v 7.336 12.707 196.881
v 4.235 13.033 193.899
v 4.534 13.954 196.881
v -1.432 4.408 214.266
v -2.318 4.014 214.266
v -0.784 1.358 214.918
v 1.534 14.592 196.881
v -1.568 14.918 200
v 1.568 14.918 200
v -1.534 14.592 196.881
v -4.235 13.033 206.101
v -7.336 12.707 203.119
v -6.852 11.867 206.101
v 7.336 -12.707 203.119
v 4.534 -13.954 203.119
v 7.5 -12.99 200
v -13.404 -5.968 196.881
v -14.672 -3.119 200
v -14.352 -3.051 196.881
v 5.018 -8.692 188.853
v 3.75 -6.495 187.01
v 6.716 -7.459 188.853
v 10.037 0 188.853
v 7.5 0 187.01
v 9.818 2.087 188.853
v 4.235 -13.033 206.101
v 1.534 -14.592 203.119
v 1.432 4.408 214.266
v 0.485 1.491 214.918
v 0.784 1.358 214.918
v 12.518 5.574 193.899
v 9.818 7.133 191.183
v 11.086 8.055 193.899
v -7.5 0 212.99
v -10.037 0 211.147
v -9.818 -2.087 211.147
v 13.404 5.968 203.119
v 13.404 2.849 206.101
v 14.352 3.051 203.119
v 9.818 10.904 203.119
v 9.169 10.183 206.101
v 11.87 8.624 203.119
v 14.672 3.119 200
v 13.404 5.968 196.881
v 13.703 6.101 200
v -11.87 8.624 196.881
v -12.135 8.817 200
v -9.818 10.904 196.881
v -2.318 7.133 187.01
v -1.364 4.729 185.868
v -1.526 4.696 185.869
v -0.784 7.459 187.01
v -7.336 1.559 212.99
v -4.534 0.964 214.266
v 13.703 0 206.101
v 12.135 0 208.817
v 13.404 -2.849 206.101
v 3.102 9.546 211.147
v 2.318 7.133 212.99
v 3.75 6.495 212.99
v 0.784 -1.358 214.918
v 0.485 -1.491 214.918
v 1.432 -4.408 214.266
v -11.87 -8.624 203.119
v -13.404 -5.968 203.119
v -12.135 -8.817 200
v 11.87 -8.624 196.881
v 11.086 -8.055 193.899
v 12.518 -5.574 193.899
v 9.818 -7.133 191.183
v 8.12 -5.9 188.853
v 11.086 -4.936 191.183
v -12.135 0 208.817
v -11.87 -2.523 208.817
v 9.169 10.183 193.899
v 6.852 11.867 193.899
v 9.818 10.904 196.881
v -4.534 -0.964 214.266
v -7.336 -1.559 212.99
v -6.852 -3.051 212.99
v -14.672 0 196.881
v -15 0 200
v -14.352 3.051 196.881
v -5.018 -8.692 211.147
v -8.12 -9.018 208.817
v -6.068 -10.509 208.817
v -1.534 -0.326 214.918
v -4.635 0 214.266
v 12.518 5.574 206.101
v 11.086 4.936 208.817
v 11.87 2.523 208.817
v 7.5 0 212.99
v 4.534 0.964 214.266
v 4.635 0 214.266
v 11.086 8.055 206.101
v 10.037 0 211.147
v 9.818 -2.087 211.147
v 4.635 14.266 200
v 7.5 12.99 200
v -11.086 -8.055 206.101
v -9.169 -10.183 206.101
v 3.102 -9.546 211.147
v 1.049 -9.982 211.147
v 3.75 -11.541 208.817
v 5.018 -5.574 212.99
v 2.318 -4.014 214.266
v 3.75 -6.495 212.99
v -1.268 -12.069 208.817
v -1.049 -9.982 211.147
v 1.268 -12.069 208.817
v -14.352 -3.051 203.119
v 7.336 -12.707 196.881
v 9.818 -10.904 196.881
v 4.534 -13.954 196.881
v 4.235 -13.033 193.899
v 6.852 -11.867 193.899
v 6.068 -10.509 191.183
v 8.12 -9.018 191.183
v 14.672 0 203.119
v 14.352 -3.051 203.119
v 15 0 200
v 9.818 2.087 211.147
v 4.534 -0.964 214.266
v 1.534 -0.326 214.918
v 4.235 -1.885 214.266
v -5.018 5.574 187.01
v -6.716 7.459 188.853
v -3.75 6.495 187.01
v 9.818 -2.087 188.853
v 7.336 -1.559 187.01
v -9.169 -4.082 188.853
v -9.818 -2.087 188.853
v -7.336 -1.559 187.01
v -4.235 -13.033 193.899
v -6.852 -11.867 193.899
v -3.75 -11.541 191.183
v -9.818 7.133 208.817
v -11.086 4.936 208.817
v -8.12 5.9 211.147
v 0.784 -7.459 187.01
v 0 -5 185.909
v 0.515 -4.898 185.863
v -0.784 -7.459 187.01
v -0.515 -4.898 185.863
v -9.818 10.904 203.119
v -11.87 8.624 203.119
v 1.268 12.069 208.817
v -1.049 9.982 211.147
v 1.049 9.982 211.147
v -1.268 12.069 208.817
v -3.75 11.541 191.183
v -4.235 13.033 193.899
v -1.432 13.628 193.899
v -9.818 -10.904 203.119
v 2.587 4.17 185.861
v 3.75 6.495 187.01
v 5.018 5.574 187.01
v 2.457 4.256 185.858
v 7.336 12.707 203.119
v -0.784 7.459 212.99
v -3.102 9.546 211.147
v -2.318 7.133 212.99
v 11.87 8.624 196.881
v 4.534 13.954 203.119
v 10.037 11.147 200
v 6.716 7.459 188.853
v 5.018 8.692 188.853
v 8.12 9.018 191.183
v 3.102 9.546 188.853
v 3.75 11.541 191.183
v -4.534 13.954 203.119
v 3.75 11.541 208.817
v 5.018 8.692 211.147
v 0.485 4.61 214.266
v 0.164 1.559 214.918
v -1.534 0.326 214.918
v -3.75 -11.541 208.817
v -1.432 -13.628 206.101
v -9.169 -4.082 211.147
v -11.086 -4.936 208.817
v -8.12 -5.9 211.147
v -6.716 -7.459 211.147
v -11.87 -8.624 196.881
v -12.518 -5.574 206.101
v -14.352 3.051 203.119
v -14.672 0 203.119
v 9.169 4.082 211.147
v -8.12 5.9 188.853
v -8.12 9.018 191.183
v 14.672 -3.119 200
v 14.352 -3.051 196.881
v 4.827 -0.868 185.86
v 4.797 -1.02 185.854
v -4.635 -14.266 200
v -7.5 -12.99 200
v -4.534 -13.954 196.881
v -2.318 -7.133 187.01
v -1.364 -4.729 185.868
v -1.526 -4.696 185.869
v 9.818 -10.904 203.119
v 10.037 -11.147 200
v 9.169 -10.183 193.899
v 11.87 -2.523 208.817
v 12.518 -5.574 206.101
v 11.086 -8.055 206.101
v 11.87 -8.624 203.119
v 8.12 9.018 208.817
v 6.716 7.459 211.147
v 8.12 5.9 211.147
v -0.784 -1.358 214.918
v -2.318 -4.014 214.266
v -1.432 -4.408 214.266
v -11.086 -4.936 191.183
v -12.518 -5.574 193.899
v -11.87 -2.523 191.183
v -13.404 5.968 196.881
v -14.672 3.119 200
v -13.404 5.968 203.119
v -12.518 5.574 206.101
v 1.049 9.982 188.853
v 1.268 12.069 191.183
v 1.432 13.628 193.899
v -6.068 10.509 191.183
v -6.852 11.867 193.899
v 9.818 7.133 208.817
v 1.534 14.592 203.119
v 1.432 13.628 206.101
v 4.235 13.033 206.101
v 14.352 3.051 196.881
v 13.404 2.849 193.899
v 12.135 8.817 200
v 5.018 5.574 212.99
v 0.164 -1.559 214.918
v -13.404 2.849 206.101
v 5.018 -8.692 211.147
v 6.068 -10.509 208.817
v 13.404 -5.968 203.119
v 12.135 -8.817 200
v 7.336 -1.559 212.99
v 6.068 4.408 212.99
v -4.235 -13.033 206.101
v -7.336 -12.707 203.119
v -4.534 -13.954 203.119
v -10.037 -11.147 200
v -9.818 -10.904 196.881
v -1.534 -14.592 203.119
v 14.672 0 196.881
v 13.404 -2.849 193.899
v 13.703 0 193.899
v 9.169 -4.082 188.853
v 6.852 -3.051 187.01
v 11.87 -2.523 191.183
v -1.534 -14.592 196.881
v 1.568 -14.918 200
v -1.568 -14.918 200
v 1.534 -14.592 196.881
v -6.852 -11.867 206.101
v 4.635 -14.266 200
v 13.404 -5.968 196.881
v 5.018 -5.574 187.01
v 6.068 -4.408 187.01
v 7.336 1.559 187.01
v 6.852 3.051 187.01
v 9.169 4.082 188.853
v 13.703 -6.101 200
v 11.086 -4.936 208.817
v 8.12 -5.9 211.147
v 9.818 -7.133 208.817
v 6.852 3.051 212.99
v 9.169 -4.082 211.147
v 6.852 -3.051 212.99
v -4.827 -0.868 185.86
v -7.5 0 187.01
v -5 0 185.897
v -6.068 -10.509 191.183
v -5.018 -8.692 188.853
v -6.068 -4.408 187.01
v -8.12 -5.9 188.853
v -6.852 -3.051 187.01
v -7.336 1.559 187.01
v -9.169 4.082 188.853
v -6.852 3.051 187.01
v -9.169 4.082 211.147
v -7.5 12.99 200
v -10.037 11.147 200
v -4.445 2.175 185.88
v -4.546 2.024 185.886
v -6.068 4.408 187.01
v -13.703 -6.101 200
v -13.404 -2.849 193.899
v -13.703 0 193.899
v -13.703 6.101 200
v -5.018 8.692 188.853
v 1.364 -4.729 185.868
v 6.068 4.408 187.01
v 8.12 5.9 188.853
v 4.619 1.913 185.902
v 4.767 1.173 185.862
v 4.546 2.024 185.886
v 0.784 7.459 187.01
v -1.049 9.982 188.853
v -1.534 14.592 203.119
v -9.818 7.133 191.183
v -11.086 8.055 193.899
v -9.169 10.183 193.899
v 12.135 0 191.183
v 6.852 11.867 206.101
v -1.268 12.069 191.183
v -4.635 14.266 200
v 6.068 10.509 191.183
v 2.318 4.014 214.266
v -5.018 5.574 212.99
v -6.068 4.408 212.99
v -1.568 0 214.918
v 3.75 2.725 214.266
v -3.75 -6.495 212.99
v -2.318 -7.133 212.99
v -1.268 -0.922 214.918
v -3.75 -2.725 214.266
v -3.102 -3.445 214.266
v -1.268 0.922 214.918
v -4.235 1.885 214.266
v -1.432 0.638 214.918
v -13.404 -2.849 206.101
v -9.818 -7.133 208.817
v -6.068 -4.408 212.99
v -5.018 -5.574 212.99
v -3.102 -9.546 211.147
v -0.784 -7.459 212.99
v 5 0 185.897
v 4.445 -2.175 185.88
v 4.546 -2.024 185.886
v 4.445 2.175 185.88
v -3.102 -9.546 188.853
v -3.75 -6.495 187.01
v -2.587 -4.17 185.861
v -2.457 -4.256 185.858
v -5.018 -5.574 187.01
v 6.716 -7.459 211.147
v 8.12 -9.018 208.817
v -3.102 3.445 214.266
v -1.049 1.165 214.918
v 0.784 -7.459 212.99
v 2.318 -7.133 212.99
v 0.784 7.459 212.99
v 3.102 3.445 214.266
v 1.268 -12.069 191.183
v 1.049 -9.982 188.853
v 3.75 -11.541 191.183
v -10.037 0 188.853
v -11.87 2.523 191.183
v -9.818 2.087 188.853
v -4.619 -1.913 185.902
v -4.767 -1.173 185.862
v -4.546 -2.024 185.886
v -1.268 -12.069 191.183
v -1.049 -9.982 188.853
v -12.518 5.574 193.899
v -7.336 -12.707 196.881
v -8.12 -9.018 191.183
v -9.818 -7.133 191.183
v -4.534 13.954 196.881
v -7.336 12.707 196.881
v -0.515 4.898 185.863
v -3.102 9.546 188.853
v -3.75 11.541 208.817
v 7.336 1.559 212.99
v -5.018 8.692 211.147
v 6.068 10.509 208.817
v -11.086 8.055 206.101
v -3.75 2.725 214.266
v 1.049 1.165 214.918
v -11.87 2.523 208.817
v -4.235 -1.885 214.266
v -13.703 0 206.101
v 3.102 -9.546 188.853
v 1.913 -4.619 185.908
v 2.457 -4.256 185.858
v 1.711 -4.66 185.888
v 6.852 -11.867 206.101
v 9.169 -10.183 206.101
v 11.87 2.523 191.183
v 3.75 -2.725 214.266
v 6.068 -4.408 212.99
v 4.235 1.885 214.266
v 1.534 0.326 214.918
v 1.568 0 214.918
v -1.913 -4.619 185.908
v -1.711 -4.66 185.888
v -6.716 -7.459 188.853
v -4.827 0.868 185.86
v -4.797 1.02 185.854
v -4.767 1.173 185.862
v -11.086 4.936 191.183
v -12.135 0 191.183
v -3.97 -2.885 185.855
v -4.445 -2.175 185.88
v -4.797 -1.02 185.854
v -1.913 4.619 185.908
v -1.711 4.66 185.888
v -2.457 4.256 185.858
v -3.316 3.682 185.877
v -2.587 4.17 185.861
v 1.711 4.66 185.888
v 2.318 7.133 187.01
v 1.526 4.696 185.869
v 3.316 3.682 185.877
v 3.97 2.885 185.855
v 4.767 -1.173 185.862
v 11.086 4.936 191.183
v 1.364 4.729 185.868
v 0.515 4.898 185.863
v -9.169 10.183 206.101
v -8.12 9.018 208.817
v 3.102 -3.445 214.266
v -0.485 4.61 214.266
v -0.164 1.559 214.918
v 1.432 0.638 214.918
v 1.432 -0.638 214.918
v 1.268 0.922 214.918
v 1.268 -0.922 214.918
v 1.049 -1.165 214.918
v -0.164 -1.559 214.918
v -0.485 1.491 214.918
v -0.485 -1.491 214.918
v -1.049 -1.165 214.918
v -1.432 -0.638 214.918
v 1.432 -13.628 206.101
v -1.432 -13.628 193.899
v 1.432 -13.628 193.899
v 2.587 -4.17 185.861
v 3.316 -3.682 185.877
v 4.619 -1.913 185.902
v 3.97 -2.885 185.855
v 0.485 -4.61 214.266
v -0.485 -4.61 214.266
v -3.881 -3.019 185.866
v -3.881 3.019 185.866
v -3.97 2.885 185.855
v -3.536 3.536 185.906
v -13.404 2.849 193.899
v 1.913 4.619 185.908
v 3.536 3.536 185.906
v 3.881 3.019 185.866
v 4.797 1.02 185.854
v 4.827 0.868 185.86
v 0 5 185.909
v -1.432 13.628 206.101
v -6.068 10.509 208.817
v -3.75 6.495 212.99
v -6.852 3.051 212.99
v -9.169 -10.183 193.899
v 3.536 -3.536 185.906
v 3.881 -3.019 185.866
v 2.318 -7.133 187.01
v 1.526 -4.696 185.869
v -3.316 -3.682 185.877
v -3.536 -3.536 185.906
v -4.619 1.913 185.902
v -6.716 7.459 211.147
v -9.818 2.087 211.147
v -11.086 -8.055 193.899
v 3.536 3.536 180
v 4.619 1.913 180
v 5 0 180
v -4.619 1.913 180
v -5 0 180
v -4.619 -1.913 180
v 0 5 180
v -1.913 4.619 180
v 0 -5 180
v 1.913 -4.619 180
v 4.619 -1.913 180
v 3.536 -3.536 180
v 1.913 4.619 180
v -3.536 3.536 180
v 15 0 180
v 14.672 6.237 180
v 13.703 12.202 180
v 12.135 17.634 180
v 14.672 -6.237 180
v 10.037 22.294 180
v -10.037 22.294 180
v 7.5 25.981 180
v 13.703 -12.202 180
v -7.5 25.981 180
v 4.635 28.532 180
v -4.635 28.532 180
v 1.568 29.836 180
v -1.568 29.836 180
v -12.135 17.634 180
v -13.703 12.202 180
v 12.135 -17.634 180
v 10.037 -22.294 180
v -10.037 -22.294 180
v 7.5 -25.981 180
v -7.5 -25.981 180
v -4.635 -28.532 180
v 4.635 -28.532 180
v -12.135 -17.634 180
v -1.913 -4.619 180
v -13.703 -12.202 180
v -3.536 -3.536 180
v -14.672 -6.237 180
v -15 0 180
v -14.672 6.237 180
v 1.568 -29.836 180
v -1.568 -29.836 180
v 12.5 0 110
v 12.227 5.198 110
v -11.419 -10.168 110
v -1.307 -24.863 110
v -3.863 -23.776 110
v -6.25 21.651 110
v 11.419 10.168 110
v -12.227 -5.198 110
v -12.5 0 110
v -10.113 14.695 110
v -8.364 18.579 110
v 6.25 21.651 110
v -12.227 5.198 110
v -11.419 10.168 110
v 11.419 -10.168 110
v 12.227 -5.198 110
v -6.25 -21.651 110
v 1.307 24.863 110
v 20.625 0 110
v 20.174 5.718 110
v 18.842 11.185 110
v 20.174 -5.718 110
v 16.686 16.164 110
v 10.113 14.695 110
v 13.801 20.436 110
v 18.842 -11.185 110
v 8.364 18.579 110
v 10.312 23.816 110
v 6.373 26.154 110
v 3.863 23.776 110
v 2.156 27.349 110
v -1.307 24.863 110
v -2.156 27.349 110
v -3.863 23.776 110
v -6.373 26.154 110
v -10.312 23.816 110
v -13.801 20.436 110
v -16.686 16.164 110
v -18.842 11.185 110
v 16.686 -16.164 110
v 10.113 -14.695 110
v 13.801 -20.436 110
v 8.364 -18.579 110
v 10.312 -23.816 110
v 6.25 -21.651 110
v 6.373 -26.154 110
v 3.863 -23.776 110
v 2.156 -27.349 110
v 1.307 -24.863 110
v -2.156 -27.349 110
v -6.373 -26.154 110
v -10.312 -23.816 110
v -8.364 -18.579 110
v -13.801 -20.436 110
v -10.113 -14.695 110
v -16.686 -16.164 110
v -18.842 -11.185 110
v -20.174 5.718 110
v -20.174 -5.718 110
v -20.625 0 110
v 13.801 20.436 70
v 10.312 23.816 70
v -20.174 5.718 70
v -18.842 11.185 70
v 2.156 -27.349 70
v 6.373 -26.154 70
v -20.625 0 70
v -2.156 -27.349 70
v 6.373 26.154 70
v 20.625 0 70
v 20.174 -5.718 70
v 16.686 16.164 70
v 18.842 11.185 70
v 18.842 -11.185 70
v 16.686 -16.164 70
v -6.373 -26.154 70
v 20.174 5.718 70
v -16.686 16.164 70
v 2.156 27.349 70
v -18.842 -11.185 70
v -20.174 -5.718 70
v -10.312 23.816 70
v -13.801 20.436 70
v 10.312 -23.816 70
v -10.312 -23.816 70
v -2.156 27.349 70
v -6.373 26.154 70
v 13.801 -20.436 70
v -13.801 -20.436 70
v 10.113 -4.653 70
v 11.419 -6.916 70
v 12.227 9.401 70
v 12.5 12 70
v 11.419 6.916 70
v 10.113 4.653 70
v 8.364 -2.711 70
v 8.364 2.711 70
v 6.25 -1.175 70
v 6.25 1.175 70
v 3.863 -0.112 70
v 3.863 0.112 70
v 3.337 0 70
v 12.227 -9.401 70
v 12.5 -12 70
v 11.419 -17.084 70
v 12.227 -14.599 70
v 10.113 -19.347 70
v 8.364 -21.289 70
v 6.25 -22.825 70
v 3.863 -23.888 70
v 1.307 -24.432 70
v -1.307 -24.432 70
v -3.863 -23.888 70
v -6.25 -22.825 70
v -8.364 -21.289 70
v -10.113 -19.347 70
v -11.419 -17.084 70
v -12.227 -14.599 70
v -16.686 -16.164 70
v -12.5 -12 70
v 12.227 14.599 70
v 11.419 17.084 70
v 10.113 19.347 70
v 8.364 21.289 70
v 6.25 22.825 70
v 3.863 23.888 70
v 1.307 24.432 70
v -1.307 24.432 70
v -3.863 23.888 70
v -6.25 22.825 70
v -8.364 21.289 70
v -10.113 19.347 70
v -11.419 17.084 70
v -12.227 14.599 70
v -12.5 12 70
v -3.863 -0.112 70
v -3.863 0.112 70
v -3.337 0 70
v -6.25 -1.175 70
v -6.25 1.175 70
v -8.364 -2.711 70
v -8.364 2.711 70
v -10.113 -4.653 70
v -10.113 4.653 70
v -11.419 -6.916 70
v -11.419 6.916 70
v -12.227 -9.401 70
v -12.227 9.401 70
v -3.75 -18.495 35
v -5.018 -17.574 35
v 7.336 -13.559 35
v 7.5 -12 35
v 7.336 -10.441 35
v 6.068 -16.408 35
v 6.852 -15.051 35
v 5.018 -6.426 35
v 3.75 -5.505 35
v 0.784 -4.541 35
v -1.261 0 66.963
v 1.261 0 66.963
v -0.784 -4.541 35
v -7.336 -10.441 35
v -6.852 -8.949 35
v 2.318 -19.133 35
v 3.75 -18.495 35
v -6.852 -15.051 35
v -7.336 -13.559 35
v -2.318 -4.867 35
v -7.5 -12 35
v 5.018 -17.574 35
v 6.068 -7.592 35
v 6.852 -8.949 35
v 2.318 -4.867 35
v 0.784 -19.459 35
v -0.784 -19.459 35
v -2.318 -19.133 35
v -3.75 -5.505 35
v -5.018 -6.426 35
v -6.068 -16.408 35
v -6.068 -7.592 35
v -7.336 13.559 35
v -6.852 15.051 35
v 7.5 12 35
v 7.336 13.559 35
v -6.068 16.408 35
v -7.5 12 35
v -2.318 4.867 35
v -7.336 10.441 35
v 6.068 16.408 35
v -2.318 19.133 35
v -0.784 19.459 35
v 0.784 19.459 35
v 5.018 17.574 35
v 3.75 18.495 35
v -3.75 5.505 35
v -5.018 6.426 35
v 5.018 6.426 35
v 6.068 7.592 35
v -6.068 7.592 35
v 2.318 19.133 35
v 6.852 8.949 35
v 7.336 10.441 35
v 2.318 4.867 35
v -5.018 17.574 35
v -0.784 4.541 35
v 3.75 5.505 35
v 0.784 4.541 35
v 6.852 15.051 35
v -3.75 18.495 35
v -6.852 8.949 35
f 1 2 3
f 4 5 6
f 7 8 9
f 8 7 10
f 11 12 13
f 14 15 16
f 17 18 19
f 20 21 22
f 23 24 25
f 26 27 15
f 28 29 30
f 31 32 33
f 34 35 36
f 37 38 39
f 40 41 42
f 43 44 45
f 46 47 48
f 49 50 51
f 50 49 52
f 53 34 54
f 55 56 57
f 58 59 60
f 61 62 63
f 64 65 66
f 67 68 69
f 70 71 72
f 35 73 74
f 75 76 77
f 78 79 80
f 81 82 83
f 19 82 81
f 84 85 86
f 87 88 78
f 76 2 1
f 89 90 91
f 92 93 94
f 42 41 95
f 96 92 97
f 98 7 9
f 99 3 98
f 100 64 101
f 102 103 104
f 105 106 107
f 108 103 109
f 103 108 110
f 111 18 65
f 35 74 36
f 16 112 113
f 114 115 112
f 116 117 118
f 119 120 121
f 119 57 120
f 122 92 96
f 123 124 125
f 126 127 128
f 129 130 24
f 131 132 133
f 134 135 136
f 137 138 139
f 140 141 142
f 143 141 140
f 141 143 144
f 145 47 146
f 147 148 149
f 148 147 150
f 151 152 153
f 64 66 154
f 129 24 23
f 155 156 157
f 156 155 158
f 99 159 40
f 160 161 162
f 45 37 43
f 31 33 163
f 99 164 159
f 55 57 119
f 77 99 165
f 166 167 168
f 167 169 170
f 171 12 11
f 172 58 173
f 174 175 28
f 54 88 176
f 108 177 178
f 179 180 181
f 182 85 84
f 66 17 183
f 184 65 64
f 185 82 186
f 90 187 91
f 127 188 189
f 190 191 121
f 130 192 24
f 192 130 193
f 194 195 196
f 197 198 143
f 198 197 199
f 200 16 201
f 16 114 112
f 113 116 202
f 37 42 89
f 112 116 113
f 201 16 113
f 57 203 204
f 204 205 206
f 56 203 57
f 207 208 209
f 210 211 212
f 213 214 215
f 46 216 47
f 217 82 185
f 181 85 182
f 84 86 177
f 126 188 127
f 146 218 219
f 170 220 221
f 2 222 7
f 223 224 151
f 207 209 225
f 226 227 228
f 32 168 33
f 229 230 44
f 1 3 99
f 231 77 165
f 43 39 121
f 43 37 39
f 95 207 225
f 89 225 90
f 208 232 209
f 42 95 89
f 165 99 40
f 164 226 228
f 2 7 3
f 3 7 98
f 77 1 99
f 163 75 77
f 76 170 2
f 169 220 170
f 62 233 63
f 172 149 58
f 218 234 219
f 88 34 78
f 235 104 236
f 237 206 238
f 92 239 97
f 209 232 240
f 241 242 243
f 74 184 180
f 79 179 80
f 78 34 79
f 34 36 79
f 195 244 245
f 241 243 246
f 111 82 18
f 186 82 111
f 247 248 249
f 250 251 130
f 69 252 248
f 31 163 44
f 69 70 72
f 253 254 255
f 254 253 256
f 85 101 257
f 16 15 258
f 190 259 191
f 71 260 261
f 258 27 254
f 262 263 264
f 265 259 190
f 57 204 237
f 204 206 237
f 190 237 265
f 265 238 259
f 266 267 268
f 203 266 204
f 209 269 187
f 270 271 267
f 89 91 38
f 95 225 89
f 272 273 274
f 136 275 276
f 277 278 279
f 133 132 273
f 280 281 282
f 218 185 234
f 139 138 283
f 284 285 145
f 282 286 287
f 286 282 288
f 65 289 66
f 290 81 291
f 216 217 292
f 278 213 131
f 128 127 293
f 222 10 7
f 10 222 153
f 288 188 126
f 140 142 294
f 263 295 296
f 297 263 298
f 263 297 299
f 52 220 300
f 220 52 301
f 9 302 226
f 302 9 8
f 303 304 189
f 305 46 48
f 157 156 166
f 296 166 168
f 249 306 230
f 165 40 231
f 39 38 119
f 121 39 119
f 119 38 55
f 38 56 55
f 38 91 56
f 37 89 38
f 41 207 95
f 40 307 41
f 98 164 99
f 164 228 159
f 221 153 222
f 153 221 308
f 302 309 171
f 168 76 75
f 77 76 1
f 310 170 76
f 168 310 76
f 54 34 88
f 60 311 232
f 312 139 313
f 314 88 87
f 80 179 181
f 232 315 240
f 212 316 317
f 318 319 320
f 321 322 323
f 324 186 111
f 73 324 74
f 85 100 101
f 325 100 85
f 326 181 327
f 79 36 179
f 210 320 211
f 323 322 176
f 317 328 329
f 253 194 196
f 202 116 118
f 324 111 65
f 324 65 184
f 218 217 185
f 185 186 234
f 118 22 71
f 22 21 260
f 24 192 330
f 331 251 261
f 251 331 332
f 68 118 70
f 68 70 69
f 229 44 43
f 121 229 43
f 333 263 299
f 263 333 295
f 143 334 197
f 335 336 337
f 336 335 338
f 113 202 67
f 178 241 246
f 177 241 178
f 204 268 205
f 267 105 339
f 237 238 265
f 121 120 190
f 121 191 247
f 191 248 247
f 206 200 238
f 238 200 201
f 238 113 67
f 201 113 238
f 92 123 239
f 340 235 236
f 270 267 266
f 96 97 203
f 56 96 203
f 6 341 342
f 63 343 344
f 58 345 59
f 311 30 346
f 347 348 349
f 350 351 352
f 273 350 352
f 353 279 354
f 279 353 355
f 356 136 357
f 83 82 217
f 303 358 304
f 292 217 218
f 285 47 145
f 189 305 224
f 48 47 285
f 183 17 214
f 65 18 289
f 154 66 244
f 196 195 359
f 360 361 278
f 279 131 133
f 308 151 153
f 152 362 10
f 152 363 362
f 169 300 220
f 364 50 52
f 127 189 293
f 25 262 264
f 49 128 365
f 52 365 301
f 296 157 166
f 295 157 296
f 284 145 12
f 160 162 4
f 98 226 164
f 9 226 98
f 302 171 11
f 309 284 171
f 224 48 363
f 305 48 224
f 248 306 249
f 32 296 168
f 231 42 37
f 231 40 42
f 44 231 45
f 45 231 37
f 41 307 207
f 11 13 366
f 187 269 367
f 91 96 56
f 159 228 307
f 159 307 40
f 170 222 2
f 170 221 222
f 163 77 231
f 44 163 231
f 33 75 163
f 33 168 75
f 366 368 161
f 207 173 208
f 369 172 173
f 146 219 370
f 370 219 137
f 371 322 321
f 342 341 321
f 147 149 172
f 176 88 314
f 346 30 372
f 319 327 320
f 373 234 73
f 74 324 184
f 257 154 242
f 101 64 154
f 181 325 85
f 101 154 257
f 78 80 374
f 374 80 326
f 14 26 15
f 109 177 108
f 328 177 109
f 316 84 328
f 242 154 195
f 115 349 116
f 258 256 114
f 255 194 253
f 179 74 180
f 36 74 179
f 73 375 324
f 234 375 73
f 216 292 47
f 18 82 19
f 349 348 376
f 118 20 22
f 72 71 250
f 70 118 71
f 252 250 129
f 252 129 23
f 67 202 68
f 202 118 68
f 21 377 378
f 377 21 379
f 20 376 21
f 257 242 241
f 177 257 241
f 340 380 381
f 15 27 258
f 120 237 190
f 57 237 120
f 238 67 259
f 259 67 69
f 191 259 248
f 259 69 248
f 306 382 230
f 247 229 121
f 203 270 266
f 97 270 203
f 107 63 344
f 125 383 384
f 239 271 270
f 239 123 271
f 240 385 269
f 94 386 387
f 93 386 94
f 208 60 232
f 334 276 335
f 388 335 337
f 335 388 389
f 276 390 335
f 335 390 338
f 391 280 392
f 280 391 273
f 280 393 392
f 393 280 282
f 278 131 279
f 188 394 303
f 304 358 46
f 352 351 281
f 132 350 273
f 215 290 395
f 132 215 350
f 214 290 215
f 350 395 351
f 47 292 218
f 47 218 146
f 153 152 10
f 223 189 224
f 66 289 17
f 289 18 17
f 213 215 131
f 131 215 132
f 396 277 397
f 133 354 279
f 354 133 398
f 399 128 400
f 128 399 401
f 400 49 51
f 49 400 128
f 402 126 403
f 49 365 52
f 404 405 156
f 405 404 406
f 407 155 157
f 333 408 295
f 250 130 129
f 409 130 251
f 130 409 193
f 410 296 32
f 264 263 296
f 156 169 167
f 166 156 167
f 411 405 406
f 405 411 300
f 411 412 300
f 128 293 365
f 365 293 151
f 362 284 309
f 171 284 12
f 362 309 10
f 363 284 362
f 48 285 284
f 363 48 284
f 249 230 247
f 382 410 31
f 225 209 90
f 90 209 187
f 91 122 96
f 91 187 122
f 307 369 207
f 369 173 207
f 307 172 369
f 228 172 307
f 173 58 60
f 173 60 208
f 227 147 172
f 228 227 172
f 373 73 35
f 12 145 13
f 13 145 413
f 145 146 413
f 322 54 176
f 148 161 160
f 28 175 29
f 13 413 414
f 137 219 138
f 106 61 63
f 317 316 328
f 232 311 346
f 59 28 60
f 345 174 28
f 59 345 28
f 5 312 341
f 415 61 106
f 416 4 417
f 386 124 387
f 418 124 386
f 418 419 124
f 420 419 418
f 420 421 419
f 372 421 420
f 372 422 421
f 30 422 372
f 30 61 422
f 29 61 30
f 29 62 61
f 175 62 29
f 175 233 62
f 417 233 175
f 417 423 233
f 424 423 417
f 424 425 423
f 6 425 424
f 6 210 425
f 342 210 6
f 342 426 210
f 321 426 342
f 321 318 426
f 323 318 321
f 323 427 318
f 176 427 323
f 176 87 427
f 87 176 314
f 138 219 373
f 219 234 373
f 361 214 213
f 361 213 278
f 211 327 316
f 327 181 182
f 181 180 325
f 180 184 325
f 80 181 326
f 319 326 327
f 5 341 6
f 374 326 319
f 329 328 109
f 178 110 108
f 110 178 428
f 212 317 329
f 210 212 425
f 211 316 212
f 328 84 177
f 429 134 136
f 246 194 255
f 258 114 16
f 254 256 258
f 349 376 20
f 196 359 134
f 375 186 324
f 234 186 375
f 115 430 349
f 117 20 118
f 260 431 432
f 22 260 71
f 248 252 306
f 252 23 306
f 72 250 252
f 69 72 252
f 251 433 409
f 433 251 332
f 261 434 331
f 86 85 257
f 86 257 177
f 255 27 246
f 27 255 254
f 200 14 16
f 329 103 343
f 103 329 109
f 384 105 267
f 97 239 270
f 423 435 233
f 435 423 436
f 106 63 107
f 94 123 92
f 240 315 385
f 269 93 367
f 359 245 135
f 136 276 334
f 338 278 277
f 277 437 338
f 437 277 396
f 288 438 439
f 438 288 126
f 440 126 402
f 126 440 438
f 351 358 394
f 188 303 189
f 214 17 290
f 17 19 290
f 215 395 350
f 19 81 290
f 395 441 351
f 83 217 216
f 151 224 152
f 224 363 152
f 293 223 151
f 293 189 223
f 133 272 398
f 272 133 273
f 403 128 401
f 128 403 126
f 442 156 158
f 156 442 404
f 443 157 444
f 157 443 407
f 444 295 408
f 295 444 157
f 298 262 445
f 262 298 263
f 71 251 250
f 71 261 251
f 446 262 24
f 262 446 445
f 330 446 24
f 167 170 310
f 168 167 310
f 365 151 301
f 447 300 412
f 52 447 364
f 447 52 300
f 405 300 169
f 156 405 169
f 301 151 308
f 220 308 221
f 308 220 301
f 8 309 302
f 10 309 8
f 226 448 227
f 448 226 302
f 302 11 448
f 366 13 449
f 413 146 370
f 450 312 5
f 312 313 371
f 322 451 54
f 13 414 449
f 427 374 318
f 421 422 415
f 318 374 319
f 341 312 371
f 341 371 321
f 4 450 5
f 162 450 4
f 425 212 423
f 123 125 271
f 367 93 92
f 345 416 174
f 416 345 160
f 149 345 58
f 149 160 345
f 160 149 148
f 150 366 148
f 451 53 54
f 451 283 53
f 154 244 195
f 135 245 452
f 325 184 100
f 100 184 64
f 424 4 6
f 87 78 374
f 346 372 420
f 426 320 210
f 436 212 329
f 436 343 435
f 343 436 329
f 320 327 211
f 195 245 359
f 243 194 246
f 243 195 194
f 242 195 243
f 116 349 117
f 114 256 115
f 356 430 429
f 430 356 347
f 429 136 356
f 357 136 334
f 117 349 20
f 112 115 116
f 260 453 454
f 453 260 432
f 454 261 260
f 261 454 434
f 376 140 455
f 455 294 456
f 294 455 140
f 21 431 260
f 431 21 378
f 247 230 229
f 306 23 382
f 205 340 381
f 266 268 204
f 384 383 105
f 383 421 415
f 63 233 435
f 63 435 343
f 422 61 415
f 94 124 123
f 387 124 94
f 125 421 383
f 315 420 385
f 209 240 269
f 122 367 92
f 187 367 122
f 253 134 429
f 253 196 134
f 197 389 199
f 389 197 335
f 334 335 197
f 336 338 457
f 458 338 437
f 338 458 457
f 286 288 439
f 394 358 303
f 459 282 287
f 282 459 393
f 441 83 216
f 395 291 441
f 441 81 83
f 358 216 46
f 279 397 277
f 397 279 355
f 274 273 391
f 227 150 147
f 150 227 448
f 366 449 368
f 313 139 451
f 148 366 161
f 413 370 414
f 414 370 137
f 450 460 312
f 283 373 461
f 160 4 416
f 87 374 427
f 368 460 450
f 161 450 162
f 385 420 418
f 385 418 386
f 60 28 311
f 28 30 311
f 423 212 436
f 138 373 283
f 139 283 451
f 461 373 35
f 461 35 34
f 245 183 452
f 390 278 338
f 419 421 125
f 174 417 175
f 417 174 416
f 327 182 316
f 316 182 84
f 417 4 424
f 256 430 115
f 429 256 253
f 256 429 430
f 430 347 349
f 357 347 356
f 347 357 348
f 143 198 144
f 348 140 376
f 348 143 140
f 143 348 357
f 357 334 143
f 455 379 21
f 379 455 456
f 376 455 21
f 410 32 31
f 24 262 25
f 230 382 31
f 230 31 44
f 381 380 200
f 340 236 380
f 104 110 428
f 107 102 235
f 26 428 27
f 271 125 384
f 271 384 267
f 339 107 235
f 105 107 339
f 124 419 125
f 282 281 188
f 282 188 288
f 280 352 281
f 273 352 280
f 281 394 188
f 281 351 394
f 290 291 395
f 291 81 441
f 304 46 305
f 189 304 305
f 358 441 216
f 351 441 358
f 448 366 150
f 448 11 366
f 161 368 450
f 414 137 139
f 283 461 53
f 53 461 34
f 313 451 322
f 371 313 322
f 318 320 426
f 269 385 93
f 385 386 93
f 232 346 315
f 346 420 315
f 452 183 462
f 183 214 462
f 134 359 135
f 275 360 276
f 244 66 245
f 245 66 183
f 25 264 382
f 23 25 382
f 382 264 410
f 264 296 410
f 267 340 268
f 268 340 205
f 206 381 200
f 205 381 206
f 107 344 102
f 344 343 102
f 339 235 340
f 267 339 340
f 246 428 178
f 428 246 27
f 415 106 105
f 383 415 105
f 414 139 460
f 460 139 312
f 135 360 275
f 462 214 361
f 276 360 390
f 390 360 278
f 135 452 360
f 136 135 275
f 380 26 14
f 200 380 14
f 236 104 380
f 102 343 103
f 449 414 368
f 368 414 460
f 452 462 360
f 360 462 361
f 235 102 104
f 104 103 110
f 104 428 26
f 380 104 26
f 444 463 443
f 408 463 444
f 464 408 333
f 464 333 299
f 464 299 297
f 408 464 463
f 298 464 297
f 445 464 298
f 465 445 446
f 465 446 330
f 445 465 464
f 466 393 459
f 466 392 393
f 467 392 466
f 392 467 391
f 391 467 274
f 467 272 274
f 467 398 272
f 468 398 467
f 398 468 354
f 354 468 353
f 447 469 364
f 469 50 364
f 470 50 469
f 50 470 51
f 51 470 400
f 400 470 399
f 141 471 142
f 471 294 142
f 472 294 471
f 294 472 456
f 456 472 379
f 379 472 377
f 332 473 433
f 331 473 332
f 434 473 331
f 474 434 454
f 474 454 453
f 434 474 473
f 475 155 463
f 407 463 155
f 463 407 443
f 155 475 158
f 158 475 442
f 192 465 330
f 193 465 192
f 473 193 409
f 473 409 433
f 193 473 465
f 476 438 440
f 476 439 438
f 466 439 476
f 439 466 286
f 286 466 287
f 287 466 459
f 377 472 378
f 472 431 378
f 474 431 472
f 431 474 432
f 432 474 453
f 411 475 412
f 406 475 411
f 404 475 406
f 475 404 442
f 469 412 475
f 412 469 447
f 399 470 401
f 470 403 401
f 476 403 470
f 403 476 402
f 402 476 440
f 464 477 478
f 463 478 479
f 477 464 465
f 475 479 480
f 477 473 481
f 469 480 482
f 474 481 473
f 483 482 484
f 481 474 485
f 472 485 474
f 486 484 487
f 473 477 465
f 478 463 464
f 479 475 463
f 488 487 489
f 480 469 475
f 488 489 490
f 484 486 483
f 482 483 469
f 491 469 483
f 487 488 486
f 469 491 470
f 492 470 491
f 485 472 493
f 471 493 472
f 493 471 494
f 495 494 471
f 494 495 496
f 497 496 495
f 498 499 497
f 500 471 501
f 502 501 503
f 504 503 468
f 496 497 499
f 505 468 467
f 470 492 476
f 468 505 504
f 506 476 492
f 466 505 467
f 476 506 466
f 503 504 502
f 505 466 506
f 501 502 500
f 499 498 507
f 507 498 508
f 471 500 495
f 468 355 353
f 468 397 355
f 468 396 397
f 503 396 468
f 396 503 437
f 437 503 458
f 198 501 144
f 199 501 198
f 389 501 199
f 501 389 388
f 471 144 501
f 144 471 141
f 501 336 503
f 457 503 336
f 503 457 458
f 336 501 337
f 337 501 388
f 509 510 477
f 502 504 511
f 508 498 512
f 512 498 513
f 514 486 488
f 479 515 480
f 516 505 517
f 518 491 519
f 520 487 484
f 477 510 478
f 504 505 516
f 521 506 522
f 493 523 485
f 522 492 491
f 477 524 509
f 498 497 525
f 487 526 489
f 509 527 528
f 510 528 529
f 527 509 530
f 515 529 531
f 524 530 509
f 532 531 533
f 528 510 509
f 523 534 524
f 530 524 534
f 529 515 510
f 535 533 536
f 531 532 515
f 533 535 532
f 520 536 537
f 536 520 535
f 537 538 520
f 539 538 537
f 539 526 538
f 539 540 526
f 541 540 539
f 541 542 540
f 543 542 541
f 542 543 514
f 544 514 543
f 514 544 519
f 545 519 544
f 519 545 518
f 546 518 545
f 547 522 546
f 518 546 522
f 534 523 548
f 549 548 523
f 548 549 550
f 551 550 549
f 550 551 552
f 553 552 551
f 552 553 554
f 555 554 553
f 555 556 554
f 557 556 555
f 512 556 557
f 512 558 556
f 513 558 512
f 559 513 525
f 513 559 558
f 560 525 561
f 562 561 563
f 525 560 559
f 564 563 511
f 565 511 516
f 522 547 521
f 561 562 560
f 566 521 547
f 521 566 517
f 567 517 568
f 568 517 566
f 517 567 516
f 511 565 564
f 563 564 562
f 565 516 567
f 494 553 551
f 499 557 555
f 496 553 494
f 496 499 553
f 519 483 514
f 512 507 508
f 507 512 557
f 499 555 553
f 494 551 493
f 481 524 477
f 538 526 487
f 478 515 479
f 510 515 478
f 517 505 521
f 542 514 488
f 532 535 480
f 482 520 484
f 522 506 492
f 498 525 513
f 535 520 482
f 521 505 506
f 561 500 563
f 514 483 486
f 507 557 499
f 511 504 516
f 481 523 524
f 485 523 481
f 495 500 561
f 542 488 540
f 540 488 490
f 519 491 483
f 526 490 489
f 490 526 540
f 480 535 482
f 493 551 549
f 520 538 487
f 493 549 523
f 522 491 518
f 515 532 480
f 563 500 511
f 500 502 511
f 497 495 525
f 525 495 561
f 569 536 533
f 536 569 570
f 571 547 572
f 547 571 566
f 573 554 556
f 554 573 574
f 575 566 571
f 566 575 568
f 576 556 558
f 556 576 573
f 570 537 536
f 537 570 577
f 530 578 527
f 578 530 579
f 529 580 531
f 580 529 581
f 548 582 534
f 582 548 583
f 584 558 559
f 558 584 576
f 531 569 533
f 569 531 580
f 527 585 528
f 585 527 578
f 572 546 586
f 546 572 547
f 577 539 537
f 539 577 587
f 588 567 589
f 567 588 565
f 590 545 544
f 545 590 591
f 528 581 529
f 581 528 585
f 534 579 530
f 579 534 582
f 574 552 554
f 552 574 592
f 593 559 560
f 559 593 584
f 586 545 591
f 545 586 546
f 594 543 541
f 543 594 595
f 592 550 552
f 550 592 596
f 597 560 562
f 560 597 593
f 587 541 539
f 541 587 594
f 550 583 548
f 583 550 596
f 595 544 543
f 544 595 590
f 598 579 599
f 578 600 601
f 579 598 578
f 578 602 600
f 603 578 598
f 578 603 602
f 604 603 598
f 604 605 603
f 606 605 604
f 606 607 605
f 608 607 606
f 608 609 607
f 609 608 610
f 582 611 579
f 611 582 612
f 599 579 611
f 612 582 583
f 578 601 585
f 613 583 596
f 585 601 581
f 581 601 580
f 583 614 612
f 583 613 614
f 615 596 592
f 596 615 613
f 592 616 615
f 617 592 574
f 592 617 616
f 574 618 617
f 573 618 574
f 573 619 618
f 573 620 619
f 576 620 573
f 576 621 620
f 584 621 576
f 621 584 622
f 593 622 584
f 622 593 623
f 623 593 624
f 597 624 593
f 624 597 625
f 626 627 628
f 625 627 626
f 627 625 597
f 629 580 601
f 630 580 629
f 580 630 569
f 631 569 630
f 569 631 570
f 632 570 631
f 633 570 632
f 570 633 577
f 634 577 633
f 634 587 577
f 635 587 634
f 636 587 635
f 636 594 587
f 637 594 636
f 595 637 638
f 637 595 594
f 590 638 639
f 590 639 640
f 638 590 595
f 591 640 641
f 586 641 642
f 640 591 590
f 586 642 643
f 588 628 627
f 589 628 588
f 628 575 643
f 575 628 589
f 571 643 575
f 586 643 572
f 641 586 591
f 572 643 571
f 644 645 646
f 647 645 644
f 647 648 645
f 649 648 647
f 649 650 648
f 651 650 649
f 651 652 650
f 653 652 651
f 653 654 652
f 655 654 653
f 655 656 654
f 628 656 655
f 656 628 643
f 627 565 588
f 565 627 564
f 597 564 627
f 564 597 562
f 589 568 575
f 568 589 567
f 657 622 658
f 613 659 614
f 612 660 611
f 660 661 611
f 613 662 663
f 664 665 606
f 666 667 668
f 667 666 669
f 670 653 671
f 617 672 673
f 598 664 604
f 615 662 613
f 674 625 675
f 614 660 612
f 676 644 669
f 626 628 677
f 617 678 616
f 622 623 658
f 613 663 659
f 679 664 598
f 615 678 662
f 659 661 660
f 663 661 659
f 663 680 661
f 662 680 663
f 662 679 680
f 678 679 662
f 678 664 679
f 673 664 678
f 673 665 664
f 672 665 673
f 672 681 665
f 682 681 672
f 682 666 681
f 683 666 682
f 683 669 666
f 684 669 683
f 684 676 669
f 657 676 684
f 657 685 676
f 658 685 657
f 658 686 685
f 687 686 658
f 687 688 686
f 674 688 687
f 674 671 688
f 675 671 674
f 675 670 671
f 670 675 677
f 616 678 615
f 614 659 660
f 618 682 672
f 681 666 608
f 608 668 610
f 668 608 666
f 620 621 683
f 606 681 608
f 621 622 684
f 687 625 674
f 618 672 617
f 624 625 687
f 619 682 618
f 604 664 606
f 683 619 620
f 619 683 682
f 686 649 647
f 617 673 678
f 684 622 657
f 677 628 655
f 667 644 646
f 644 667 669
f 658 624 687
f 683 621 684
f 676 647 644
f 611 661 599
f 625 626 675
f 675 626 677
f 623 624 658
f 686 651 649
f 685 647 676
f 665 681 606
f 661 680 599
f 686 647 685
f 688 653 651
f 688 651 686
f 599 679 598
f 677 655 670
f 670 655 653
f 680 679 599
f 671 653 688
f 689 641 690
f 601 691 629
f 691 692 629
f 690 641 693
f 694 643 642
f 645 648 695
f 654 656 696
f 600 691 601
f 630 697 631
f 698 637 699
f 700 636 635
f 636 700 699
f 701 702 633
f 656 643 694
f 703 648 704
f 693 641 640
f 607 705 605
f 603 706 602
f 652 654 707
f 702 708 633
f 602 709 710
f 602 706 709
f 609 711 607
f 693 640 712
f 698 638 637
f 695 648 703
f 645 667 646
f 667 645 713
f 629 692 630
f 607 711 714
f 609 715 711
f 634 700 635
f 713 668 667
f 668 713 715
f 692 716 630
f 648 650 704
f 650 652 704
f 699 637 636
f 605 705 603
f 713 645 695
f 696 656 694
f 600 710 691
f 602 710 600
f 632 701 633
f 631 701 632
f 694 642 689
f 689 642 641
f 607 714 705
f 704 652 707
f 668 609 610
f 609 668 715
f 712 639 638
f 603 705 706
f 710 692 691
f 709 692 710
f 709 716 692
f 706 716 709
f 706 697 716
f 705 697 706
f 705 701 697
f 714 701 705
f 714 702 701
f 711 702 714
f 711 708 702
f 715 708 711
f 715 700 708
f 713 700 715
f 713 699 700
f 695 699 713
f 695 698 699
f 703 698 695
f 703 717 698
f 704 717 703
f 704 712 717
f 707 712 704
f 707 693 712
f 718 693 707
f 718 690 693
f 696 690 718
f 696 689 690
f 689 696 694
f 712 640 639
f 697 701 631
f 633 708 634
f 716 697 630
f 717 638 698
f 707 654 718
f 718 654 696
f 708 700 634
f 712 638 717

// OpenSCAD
module player() {
    // Head
    color("brown")
        translate([0, 0, 200])
            sphere(d=30);
    // Collo
    color("pink")
        translate([0, 0, 180])
            cylinder(d=10, h=10);
    // Busto
    color("white")
        translate([0, 0, 110])
            scale([0.5, 1, 1])
                cylinder(d1=50, d2=60, h=70);
    // Pantaloncini
    color("darkgray")
        translate([0, 0, 70])
            scale([0.75, 1, 1])
                cylinder(d=55, h=40);
    // Gambe
    color("pink")
        translate([0,-12.0, 35])
            scale([1, 1, 1])
                cylinder(d2=25, d1=15, h=35);
    color("pink")
        translate([0, 12.0, 35])
            scale([1, 1, 1])
                cylinder(d2=25, d1=15, h=35);
}

/*
union() {
    // Fondo
    color([0.75, 0.75, 1.0])
        cube([9800, 8900, 2.9], center=true);
    
    // Campo di gioco
    color([1.0, 1.0, 0.0])
        cube([1800, 900, 3], center=true);
    
    // Linee
    color("white") {
        cube([40, 900, 3.1], center = true);
        translate([0,-445, 0])
            cube([1800, 40, 3.1], center=true);
        translate([0, 445, 0])
            cube([1800, 40, 3.1], center=true);
        translate([0, 445, 0])
            cube([1800, 40, 3.1], center=true);
           
        translate([295, 0, 0])
            cube([40, 900, 3.1], center = true);
        translate([-295, 0, 0])
            cube([40, 900, 3.1], center = true);
           
        translate([895, 0, 0])
            cube([40, 900, 3.1], center = true);
        translate([-895, 0, 0])
            cube([40, 900, 3.1], center = true);
    }
    // Pali
    color("orange") {
        translate([0,-545, 0])
            cylinder(d=40, h=250);
        translate([0, 545, 0])
            cylinder(d=40, h=250);
    }
    
    // Rete
    color("white") {// Bande
        translate([0, 0, 225])
            cube([1, 1090, 25], center=true);
        translate([0, 0, 125])
            cube([1, 1090, 25], center=true);
         translate([0, 445, 175])
            cube([1, 25, 100], center=true);
         translate([0,-445, 175])
            cube([1, 25, 100], center=true);
  }
  color("red") {
      for(y=[20:40:860]) {
          translate([0, y-440, 175])
            cylinder(d=4, h=100, center=true);
      }
      for(z=[20:40:80]) {
            translate([0, 0, 120+z])
                rotate([90, 0, 0])
                    cylinder(d=4, h=885, center=true);
      }
  }
}
*/
player();
